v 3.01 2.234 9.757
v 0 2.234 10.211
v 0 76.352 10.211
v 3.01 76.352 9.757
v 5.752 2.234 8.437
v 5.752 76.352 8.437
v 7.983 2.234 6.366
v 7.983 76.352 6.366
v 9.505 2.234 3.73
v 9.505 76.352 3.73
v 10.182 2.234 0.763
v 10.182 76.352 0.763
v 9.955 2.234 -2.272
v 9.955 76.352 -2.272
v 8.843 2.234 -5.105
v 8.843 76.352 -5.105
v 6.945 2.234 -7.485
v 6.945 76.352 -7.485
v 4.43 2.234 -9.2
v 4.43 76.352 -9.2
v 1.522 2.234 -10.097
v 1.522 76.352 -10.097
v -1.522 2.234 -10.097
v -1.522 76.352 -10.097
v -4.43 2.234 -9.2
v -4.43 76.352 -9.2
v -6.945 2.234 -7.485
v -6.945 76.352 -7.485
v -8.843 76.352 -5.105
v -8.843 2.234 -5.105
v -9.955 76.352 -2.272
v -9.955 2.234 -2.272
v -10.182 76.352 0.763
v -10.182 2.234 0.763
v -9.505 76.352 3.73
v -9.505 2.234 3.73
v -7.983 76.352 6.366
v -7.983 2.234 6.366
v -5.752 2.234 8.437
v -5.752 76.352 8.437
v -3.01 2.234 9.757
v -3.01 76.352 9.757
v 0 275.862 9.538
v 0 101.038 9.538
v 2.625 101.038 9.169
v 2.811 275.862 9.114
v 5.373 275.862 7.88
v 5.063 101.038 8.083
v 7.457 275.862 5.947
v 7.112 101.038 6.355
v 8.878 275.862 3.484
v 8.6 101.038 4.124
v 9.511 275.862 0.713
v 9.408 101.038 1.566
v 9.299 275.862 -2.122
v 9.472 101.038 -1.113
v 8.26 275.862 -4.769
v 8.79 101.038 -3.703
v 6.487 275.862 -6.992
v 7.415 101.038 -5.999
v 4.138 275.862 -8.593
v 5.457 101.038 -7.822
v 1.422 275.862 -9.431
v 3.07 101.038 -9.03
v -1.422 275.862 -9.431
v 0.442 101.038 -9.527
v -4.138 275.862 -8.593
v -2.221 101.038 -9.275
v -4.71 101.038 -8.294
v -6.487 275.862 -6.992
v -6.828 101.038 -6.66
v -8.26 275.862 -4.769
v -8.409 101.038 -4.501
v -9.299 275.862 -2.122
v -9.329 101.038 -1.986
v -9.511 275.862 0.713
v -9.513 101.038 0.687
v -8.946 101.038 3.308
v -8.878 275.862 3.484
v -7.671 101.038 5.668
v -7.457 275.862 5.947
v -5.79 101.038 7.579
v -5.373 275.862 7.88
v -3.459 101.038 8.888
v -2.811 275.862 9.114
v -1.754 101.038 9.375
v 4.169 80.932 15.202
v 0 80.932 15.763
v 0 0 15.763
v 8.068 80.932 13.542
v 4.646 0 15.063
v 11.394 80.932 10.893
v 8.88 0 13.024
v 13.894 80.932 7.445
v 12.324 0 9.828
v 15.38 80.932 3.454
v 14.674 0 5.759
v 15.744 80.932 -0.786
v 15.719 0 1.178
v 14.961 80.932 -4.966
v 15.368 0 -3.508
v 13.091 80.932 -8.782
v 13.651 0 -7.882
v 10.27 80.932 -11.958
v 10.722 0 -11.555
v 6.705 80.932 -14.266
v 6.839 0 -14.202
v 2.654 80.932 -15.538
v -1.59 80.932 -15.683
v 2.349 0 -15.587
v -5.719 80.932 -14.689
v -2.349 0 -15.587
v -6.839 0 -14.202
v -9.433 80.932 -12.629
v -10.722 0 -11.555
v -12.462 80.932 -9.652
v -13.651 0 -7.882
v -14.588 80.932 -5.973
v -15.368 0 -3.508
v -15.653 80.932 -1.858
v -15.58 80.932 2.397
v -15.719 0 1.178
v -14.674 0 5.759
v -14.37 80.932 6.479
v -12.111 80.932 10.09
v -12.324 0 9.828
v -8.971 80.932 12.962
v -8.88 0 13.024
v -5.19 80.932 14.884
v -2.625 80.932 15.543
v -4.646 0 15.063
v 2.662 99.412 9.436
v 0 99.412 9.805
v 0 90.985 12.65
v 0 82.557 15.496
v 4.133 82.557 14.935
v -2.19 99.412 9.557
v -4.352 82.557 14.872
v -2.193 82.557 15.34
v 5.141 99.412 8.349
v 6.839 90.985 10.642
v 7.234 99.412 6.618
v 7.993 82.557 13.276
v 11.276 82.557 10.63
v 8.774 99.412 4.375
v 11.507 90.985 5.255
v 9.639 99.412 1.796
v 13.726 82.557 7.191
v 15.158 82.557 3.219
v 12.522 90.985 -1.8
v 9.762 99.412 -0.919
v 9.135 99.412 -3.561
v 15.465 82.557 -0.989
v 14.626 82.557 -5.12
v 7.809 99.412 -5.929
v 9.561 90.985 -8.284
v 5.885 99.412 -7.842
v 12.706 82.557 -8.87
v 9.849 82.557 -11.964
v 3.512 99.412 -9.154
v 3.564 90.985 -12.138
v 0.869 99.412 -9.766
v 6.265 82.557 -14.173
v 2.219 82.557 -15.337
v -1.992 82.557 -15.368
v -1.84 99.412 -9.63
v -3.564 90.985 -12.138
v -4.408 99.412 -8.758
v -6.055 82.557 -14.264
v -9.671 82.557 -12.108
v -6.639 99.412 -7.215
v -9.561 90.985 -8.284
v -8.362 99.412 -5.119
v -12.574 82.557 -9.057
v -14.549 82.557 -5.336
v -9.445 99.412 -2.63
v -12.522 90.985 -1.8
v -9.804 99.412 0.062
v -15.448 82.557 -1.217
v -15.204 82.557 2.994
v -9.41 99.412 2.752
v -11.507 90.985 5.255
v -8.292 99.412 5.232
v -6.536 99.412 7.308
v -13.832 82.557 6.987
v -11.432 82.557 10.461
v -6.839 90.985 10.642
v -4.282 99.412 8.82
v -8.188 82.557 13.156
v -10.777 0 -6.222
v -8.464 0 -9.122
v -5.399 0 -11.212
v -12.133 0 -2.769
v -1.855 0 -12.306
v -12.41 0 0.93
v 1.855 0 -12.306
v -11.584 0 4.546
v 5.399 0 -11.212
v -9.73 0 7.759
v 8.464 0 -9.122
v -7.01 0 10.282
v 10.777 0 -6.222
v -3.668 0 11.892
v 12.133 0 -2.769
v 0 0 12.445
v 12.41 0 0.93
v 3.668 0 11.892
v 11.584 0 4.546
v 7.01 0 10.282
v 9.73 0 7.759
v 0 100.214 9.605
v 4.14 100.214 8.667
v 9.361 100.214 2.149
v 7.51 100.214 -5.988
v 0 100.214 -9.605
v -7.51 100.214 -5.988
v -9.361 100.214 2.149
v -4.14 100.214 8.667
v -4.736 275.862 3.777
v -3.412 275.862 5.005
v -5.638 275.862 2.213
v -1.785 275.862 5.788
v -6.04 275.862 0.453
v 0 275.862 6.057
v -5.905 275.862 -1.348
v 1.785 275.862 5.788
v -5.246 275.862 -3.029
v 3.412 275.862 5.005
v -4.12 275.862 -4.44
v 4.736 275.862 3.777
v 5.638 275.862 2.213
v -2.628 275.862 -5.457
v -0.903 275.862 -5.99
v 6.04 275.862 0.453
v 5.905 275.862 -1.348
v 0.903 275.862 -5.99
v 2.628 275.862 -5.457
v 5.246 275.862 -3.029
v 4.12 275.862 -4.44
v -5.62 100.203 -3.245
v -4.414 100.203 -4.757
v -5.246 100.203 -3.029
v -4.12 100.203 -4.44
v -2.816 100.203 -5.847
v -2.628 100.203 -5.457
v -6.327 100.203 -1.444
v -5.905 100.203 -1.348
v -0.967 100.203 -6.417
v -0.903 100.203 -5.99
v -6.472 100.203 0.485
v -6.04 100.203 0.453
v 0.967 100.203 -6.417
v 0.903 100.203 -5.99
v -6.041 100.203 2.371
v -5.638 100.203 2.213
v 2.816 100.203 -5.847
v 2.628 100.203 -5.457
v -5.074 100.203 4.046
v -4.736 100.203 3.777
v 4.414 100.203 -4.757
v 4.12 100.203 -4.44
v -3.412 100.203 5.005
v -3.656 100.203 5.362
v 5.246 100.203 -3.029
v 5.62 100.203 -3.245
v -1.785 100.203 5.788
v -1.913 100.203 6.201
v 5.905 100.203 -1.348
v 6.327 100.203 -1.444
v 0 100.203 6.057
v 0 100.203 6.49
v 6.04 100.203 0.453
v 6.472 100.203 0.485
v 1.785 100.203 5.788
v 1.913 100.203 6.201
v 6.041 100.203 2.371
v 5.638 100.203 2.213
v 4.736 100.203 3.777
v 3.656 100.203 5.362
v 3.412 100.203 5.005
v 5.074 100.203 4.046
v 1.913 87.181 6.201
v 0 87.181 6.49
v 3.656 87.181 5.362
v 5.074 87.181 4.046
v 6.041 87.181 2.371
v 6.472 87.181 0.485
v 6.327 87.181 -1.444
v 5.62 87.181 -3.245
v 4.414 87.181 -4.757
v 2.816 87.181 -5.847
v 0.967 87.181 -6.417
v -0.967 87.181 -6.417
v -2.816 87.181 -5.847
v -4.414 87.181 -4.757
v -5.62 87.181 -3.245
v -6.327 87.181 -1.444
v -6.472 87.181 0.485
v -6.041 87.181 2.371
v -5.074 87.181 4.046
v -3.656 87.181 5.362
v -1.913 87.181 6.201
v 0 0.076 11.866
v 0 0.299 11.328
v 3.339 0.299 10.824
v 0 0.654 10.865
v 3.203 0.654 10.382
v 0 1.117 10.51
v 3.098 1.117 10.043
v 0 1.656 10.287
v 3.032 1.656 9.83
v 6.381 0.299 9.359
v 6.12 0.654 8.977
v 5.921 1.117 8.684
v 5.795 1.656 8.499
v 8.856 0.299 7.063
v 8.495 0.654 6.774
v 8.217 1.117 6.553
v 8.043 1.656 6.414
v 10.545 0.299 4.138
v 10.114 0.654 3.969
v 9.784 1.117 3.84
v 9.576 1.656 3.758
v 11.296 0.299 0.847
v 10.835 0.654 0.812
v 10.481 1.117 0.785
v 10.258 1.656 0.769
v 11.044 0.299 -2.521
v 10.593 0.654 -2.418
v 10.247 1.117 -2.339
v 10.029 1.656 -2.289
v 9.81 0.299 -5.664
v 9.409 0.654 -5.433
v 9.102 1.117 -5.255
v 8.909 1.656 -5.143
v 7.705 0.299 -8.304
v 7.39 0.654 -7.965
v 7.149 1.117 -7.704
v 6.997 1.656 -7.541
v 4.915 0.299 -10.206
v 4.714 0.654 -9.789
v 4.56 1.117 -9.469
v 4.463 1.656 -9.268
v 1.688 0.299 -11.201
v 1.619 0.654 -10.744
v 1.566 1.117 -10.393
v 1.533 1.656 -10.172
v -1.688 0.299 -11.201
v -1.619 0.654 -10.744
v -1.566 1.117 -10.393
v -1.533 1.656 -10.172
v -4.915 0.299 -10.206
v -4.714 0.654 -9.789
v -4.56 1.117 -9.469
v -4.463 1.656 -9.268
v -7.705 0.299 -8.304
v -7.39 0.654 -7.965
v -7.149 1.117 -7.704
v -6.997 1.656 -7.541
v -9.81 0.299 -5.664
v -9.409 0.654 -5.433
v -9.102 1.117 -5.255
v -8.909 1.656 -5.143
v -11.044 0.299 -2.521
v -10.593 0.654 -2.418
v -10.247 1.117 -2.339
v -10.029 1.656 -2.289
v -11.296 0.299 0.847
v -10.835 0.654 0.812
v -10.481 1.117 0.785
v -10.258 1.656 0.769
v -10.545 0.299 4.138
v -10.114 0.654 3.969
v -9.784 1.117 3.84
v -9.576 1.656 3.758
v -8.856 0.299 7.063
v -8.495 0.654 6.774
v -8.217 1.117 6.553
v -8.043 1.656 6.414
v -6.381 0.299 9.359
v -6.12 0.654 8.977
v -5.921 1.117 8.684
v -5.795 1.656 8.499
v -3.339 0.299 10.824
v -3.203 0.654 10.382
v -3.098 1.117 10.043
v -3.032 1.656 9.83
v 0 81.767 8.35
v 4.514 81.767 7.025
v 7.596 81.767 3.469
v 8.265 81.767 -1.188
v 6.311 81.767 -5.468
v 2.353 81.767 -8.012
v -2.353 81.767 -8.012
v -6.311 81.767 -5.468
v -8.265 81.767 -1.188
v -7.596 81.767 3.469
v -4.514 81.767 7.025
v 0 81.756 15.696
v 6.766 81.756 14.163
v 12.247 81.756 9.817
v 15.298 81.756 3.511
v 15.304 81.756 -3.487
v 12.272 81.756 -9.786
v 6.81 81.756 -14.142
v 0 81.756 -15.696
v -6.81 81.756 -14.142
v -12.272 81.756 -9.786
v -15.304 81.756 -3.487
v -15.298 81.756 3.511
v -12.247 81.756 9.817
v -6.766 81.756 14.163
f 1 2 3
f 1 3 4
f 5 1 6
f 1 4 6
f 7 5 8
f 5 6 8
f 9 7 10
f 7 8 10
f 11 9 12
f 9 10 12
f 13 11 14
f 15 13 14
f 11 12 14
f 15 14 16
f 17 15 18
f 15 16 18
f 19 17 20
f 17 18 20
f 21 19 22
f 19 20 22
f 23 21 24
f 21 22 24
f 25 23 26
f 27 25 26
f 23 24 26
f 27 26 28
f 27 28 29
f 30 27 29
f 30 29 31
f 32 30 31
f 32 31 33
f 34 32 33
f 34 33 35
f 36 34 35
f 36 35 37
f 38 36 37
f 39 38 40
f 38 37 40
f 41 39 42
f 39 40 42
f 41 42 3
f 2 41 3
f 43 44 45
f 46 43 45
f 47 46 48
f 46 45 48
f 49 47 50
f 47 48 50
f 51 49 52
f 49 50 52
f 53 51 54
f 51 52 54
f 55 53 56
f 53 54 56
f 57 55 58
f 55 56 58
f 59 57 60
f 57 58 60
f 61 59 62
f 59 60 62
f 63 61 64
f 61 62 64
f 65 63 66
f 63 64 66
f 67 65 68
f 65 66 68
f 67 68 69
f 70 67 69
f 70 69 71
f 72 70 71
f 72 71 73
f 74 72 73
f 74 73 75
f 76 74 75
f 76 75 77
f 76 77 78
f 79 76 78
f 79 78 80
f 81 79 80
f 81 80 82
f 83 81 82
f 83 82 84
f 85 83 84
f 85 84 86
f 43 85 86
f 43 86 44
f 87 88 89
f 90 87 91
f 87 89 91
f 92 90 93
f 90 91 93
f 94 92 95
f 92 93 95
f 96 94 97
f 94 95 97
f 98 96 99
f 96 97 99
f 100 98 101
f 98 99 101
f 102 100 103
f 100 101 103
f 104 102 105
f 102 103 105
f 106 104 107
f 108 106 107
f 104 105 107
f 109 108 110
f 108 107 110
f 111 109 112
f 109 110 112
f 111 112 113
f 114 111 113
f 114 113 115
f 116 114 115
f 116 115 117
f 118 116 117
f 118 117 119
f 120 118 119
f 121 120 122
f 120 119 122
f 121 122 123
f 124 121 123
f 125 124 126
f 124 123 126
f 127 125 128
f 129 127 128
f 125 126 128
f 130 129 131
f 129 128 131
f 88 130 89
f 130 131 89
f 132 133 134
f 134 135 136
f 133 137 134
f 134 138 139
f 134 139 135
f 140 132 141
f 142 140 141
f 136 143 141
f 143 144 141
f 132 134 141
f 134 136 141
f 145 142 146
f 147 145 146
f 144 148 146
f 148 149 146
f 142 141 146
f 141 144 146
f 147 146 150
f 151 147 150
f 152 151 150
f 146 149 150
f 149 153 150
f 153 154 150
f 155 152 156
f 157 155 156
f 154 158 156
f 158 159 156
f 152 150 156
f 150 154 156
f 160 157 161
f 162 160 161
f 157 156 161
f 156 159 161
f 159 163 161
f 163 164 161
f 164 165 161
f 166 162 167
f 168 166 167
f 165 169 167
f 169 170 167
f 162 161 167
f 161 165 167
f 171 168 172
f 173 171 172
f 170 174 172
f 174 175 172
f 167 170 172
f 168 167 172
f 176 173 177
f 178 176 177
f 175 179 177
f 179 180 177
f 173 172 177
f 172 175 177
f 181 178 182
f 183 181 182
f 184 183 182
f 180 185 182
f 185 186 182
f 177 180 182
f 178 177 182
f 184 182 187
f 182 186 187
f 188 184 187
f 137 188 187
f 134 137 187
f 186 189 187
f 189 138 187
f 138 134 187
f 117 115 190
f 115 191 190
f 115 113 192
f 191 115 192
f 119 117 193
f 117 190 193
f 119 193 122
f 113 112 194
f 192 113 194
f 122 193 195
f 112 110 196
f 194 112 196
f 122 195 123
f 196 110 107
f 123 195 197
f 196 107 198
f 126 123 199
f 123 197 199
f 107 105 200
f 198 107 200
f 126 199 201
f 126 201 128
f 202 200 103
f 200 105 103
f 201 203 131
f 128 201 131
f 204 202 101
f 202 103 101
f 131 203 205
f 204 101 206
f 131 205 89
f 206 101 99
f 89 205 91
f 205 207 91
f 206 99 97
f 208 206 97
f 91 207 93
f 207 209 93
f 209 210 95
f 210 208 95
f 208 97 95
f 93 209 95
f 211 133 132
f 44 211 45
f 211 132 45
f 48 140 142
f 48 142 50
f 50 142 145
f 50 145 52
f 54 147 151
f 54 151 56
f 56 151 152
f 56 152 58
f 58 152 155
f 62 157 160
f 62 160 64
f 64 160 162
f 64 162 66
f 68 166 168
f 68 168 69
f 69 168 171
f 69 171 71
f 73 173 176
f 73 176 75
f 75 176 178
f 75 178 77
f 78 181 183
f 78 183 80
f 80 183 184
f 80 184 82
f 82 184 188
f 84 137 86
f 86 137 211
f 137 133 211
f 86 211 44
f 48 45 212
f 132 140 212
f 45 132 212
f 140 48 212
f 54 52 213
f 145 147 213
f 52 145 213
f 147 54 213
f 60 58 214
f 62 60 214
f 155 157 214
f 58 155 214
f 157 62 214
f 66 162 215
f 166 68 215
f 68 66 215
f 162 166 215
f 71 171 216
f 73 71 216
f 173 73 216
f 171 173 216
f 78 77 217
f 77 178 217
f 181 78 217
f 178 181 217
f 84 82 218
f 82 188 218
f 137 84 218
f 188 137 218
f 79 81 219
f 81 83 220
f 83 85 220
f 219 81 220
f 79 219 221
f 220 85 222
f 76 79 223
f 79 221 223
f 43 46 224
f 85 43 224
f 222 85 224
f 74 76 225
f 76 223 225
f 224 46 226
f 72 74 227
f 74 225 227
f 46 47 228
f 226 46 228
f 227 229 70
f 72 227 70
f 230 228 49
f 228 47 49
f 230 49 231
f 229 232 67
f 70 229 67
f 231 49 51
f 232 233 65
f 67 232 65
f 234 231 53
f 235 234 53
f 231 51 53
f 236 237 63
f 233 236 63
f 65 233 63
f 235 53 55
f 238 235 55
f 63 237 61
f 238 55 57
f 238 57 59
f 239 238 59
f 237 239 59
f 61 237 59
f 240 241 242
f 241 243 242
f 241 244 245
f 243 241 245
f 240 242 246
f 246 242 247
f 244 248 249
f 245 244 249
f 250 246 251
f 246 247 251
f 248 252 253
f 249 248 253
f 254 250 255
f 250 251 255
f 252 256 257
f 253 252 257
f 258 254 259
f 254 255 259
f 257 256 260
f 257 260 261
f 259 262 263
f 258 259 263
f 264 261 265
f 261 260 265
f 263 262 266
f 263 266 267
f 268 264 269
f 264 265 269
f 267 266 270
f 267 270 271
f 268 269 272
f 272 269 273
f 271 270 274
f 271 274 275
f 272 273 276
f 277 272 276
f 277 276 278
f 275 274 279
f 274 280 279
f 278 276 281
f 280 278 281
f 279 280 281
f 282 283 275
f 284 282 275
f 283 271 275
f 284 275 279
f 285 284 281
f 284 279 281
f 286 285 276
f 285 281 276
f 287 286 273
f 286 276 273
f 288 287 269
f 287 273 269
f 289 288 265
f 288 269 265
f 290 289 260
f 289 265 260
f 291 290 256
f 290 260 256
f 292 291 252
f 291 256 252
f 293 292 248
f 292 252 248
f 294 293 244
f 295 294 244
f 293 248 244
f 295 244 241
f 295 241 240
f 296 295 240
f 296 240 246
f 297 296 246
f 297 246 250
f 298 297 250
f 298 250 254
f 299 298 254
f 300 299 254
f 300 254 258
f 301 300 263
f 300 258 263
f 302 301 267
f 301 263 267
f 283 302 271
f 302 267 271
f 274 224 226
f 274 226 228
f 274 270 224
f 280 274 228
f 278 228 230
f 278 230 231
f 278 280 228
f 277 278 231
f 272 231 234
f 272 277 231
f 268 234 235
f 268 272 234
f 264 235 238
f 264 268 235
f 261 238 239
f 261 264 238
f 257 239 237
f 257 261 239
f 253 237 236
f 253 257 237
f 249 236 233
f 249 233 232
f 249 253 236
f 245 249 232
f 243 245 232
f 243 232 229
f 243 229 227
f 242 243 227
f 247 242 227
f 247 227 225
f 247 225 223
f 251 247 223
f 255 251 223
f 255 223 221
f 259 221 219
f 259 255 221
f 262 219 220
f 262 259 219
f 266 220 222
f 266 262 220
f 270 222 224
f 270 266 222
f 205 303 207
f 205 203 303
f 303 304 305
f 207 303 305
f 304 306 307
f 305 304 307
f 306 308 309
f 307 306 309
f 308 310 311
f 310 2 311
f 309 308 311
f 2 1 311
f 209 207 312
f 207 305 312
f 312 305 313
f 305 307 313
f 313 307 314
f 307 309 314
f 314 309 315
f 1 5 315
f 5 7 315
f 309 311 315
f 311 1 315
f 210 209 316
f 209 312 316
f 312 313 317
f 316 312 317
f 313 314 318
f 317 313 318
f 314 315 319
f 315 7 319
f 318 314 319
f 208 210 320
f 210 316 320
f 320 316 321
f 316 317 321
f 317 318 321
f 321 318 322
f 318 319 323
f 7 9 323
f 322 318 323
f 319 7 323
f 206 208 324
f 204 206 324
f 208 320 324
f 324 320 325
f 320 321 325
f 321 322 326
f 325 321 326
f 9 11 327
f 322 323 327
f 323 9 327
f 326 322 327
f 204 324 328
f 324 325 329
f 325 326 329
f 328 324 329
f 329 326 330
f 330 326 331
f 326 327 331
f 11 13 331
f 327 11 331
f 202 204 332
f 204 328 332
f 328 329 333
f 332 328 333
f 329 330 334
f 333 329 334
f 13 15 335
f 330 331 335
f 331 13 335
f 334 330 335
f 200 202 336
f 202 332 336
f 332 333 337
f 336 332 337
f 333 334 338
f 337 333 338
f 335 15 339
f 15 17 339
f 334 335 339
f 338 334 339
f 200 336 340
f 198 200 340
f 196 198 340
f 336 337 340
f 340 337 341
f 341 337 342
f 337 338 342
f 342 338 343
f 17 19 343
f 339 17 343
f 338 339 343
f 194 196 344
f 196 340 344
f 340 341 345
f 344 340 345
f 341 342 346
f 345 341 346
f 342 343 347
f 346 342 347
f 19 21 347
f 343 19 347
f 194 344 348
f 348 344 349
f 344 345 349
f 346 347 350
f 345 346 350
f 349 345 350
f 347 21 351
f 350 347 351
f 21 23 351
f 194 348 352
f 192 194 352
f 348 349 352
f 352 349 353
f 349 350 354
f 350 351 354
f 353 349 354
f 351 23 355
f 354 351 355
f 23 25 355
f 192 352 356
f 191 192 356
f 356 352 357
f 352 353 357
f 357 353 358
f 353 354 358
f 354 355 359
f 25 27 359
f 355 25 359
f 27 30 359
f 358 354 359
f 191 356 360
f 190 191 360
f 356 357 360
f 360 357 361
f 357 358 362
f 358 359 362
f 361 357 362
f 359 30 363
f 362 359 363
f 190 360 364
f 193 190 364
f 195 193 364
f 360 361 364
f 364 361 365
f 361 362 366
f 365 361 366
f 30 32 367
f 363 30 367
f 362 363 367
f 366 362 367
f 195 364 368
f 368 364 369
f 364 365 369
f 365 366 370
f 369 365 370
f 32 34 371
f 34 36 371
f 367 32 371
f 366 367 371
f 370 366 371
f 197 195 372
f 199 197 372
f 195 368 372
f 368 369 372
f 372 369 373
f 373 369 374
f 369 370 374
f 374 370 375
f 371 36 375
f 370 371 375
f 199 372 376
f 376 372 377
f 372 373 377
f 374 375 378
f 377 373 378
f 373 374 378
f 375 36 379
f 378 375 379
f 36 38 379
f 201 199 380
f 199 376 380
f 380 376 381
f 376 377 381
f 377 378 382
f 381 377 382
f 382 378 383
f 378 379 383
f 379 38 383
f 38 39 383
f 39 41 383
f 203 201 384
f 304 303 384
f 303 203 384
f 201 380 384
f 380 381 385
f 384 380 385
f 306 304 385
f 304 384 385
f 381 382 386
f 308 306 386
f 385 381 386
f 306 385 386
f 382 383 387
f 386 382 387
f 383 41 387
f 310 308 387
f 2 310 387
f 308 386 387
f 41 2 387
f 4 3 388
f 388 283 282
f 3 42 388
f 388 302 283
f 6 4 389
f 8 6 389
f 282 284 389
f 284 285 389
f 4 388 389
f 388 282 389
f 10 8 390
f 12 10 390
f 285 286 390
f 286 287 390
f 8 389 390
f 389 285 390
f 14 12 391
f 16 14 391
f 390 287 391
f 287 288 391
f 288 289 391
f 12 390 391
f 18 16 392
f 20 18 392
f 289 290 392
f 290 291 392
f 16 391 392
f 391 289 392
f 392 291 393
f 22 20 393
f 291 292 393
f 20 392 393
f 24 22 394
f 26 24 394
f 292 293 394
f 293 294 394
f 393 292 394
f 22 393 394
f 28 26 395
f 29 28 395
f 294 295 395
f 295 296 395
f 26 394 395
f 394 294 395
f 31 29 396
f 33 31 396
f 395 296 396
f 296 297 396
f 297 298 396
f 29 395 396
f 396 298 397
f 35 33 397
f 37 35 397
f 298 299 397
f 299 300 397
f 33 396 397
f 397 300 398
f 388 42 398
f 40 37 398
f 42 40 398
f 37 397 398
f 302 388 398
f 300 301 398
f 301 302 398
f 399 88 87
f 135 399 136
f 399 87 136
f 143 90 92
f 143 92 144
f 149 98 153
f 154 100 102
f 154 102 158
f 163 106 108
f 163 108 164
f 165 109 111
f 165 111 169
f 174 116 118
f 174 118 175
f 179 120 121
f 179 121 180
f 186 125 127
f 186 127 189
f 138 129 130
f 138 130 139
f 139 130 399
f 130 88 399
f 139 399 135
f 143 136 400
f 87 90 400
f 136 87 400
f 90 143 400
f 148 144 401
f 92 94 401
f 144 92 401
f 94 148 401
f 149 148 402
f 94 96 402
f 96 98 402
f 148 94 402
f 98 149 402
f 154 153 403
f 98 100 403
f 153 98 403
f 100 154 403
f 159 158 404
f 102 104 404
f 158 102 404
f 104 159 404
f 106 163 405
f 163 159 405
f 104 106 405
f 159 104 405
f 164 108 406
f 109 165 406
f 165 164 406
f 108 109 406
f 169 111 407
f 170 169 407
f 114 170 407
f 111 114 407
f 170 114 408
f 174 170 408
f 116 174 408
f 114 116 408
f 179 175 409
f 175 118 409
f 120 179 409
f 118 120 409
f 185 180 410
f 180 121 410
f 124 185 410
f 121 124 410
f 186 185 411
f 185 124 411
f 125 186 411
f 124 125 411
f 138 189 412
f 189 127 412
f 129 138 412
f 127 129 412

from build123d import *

# Parameters (mm, degrees)
F2_R     = 2.2337294629
F3_DEPTH = 94.1962972283
F4_R     = 5.08


with BuildPart() as f1:
    # F0 (on Right) → F1 (revolve)
    with BuildSketch(Plane.YZ):
        Polygon((87.180994451, 6.4897), (100.203, 6.4897), (100.203, 6.0571772046), (181.6655695438, 6.0571772046), (181.6655695438, 9.5376558602), (100.203, 9.5376558602), (81.7666972255, 15.7631933689), (0, 15.7631933689), (0, 10.2108), (6.6675017588, 10.2108), (76.3524, 10.2108), align=None)
    revolve(axis=Axis((0, 3.5269334912, 0), (0, 1, 0)))

    # F2
    f2_edges = [f1.edges().sort_by_distance(p)[0] for p in [
        (0, 0, -10.2108),
    ]]
    fillet(f2_edges, radius=F2_R)

    # F3 (add): a face of the model
    f3_faces = [f1.faces().sort_by_distance(p)[0] for p in [
        (0, 181.6655695438, -6.3269428501),
    ]]
    extrude(f3_faces, amount=F3_DEPTH)

    # F4
    f4_edges = [f1.edges().sort_by_distance(p)[0] for p in [
        (0, 81.766697, -15.763193),
        (0, 100.203, -9.537656),
    ]]
    fillet(f4_edges, radius=F4_R)


solid = f1.part
